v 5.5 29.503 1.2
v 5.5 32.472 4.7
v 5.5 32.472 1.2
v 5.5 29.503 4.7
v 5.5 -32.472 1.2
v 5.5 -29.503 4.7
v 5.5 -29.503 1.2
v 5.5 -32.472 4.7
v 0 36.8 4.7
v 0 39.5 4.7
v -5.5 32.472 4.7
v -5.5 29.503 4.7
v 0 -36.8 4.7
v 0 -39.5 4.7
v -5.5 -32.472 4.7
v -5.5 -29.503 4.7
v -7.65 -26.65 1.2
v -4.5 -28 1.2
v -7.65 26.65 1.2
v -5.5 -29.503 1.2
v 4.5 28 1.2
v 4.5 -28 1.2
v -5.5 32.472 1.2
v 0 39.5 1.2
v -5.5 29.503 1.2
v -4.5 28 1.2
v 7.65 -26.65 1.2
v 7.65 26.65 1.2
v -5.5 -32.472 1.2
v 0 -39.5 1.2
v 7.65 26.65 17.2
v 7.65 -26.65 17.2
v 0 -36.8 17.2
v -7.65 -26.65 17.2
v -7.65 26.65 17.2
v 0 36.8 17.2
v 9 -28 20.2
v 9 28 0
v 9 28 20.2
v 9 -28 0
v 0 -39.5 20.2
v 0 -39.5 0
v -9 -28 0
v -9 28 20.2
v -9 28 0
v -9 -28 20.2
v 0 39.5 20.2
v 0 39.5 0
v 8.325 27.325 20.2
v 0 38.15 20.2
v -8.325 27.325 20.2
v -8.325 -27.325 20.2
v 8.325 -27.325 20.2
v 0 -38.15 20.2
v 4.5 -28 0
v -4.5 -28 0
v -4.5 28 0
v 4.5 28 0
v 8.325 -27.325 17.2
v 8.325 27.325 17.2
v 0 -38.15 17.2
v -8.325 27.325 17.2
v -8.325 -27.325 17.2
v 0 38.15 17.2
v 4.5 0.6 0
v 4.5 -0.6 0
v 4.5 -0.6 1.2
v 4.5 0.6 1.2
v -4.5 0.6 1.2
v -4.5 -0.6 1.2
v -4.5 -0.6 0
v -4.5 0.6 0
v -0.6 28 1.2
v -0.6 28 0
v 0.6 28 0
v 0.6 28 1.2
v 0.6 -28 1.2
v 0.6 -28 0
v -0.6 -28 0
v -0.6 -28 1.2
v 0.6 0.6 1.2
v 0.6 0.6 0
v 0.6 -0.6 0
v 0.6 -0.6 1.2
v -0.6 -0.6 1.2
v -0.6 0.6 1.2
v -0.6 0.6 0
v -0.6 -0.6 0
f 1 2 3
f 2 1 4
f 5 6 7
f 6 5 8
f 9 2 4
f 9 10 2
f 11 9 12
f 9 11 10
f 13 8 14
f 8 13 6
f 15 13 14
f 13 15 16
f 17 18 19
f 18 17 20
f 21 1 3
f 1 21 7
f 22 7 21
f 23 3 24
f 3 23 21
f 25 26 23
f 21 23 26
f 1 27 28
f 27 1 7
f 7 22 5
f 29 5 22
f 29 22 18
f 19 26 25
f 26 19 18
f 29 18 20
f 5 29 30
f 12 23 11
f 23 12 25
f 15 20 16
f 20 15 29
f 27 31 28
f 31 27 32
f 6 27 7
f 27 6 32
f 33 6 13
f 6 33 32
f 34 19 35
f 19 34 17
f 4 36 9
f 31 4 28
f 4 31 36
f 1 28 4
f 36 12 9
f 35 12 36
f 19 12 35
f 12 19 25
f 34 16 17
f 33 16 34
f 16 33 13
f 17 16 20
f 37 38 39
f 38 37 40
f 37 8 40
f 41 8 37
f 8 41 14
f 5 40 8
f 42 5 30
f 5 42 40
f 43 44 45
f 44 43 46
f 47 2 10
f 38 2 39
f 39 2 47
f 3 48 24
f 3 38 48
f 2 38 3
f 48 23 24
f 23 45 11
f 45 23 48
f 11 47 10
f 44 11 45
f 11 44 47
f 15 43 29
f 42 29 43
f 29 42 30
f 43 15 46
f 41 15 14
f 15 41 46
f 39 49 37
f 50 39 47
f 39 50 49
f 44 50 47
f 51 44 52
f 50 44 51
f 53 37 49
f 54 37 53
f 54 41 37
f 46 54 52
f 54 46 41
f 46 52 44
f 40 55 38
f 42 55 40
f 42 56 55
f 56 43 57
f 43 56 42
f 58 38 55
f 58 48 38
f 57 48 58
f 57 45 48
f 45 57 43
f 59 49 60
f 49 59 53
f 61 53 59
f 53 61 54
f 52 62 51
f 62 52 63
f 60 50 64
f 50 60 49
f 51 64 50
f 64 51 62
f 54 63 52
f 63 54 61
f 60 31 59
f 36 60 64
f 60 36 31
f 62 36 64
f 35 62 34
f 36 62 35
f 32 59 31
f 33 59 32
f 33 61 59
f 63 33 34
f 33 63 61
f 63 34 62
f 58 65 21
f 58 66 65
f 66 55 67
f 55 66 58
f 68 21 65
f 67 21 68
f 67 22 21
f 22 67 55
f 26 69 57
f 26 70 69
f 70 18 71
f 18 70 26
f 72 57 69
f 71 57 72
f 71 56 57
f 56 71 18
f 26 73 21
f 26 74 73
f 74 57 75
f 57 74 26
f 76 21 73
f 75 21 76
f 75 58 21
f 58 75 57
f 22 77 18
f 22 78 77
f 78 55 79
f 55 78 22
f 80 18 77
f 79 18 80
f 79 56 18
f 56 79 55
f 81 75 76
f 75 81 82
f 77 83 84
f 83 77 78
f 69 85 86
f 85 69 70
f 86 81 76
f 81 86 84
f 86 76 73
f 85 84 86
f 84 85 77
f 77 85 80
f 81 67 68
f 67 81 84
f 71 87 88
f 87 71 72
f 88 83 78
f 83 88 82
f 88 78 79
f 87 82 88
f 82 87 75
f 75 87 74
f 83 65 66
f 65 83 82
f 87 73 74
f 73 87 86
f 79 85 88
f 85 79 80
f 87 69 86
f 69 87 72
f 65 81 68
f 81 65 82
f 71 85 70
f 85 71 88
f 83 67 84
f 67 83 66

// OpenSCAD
kerf = 0.5;
kerft = kerf * 2;

seg_kw = 19;
seg_w = seg_kw - kerft;
seg_sh = 12;
seg_mh = 56;
seg_kth = (seg_sh * 2) + seg_mh;
seg_th = seg_kth - kerft;

wall_w = 1.2 + 1.5;
wall_ws = 0.6 + 0.75;
wall_h = 19.0;
bot_h  = 1.2;
tot_h  = wall_h + bot_h;

gap_ww = 11.0;
gap_wl = 6.0;
gap_tl = 3.5;
gap_tt = 3.5;

union() {
  difference() {
    polyhedron(
      points = [
        [-seg_w/2, -seg_mh/2, 0],
        [0, -seg_th/2, 0],
        [seg_w/2, -seg_mh/2, 0],
        [seg_w/2, seg_mh/2, 0],
        [0, seg_th/2, 0],
        [-seg_w/2, seg_mh/2, 0],
        [-seg_w/2, -seg_mh/2, tot_h],
        [0, -seg_th/2, tot_h],
        [seg_w/2, -seg_mh/2, tot_h],
        [seg_w/2, seg_mh/2, tot_h],
        [0, seg_th/2, tot_h],
        [-seg_w/2, seg_mh/2, tot_h],
      ],
      faces =  [
        [0, 1, 2, 3, 4, 5],
        [0, 5, 11, 6],
        [1, 0, 6, 7],
        [2, 1, 7, 8],
        [3, 2, 8, 9],
        [4, 3, 9, 10],
        [5, 4, 10, 11],
        [11, 10, 9, 8, 7, 6]
      ]
    );
    translate([0, 0, tot_h-3]) {
      polyhedron(
        points = [
          [-seg_w/2+wall_ws/2, -seg_mh/2+wall_ws/2, 0],
          [0, -seg_th/2+wall_w/2, 0],
          [seg_w/2-wall_ws/2, -seg_mh/2+wall_ws/2, 0],
          [seg_w/2-wall_ws/2, seg_mh/2-wall_ws/2, 0],
          [0, seg_th/2-wall_w/2, 0],
          [-seg_w/2+wall_ws/2, seg_mh/2-wall_ws/2, 0],
          [-seg_w/2+wall_ws/2, -seg_mh/2+wall_ws/2, tot_h],
          [0, -seg_th/2+wall_w/2, tot_h],
          [seg_w/2-wall_ws/2, -seg_mh/2+wall_ws/2, tot_h],
          [seg_w/2-wall_ws/2, seg_mh/2-wall_ws/2, tot_h],
          [0, seg_th/2-wall_w/2, tot_h],
          [-seg_w/2+wall_ws/2, seg_mh/2-wall_ws/2, tot_h],
        ],
        faces =  [
          [0, 1, 2, 3, 4, 5],
          [0, 5, 11, 6],
          [1, 0, 6, 7],
          [2, 1, 7, 8],
          [3, 2, 8, 9],
          [4, 3, 9, 10],
          [5, 4, 10, 11],
          [11, 10, 9, 8, 7, 6]
        ]
      );
    }
    translate([0, 0, bot_h]) {
      polyhedron(
        points = [
          [-seg_w/2+wall_ws, -seg_mh/2+wall_ws, 0],
          [0, -seg_th/2+wall_w, 0],
          [seg_w/2-wall_ws, -seg_mh/2+wall_ws, 0],
          [seg_w/2-wall_ws, seg_mh/2-wall_ws, 0],
          [0, seg_th/2-wall_w, 0],
          [-seg_w/2+wall_ws, seg_mh/2-wall_ws, 0],
          [-seg_w/2+wall_ws, -seg_mh/2+wall_ws, tot_h],
          [0, -seg_th/2+wall_w, tot_h],
          [seg_w/2-wall_ws, -seg_mh/2+wall_ws, tot_h],
          [seg_w/2-wall_ws, seg_mh/2-wall_ws, tot_h],
          [0, seg_th/2-wall_w, tot_h],
          [-seg_w/2+wall_ws, seg_mh/2-wall_ws, tot_h],
        ],
        faces =  [
          [0, 1, 2, 3, 4, 5],
          [0, 5, 11, 6],
          [1, 0, 6, 7],
          [2, 1, 7, 8],
          [3, 2, 8, 9],
          [4, 3, 9, 10],
          [5, 4, 10, 11],
          [11, 10, 9, 8, 7, 6]
        ]
      );
      translate([0,0,bot_h+.55]) {
        translate([0,0,-(gap_tt-gap_tl)/2]) {
          cube([gap_ww, 100, gap_tl], center=true);
        }
        cube([gap_wl, 100, gap_tt], center=true);
      }
    }
    cube([seg_w/2,seg_mh,10],center=true);
  }
  translate([0,0,bot_h/2]) {
    cube([1.2,seg_mh,bot_h],center=true);
    cube([seg_w/2,1.2,bot_h],center=true);
  }
}
